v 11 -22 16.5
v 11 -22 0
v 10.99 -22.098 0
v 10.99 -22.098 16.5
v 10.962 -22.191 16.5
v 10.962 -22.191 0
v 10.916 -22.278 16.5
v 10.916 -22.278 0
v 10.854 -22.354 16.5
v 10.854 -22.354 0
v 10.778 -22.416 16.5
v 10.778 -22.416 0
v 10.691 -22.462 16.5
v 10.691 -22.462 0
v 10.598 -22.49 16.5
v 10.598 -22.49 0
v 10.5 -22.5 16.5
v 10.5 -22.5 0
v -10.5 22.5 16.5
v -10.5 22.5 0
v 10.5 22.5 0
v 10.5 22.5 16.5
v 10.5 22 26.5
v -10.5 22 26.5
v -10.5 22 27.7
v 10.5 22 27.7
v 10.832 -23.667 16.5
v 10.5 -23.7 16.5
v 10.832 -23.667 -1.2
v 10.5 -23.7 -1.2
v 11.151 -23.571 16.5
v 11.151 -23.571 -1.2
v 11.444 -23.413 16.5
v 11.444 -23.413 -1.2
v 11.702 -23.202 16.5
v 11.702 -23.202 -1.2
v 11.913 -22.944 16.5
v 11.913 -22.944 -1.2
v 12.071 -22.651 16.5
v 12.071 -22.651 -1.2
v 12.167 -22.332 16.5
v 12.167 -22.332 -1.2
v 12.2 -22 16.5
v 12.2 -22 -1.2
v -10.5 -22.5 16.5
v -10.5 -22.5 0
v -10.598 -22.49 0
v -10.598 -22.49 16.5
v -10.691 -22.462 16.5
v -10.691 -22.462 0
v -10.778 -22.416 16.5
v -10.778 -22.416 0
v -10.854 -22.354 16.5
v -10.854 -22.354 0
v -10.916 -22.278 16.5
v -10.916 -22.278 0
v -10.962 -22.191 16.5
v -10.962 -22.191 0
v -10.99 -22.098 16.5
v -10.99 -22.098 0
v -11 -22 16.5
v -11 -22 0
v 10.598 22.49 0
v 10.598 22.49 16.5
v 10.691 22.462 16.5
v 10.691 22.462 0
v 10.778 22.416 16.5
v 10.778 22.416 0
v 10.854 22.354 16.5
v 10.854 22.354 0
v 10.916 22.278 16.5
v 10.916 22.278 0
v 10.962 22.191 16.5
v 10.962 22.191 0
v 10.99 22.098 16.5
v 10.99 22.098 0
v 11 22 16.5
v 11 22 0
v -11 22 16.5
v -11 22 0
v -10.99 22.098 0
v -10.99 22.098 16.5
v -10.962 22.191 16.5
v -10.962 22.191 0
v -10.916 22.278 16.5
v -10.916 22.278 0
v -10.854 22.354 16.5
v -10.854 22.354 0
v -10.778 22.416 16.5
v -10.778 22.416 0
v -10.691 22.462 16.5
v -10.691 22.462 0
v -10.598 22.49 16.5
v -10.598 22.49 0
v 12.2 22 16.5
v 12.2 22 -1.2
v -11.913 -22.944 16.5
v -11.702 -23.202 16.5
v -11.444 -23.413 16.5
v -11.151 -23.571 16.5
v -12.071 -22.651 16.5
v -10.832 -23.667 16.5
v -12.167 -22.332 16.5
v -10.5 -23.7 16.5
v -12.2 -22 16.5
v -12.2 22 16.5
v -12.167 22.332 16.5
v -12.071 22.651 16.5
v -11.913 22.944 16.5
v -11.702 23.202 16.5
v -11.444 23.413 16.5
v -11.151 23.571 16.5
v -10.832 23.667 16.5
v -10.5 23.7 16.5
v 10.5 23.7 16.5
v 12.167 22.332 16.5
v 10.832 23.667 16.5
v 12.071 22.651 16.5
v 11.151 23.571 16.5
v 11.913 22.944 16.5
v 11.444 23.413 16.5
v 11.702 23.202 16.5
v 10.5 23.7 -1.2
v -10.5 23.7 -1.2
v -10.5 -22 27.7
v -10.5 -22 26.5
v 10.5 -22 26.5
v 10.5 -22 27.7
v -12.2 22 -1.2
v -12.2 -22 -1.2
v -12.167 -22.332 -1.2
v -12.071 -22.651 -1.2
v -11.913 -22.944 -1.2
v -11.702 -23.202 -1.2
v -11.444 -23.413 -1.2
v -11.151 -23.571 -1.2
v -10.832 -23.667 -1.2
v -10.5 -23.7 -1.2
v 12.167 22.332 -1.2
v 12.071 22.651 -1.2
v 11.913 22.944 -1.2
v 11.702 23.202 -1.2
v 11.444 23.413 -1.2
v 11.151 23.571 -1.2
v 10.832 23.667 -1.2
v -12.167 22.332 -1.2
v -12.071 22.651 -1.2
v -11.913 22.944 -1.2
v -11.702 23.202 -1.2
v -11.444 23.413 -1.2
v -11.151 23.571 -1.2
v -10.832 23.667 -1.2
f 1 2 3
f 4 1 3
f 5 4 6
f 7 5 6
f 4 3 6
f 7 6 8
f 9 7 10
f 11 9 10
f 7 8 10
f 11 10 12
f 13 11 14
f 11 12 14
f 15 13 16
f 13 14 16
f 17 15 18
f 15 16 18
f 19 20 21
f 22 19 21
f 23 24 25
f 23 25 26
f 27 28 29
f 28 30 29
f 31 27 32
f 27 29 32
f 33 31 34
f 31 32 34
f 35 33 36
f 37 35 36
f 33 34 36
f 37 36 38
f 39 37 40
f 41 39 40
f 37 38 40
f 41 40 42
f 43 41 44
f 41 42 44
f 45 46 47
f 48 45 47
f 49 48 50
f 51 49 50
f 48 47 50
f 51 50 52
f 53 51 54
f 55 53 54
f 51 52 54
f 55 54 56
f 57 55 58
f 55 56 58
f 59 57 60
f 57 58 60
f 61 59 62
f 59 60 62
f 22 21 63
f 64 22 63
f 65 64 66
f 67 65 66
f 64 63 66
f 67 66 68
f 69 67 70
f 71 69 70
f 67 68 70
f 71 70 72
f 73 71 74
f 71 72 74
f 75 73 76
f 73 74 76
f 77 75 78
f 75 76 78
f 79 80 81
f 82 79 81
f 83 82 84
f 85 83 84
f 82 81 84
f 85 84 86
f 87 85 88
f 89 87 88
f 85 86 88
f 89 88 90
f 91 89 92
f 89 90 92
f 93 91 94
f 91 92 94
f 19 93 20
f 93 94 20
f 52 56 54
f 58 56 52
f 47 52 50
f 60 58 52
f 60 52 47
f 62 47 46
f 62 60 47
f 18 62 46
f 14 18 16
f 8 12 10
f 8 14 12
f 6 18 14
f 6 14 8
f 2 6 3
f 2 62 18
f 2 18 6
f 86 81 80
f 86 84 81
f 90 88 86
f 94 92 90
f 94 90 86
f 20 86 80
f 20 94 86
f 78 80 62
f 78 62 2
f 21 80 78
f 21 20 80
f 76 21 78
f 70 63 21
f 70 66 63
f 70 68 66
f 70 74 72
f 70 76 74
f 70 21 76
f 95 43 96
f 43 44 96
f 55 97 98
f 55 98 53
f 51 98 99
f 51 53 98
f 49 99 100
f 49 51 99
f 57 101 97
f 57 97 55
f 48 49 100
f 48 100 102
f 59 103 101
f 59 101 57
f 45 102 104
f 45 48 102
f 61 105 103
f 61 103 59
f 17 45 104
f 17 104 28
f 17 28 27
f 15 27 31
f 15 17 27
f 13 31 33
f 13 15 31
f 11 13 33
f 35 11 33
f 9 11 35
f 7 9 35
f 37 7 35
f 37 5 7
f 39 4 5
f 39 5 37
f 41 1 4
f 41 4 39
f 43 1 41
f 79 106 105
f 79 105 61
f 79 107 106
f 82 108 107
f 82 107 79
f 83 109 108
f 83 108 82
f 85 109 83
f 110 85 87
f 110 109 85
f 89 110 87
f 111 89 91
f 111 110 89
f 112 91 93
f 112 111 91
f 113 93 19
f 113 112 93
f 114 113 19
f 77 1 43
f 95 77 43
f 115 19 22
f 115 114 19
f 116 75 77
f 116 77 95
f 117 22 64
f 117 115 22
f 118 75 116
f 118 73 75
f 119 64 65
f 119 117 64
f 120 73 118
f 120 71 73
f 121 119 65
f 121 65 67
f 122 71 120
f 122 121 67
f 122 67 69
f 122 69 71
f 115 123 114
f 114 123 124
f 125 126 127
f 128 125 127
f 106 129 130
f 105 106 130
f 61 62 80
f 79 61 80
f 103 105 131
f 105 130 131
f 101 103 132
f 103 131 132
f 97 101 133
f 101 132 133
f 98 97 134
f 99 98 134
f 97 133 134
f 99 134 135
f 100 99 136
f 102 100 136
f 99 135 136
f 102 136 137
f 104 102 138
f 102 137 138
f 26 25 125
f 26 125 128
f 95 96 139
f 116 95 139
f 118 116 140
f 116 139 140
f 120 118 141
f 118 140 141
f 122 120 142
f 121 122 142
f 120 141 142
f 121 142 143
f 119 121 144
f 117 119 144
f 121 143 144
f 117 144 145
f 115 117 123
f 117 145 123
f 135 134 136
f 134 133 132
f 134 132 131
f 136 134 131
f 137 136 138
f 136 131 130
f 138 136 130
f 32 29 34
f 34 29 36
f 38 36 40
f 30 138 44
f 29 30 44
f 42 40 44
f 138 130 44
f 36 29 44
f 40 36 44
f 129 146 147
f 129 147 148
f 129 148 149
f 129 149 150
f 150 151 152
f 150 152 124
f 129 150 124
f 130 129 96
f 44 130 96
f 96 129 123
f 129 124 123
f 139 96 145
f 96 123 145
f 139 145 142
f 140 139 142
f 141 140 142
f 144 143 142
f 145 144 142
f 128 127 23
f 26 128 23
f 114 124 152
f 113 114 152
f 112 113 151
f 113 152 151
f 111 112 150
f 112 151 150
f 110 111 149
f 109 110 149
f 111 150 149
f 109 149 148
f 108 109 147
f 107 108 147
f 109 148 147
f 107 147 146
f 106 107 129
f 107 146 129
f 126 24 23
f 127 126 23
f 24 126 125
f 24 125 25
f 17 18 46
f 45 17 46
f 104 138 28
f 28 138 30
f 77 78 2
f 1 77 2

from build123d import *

# Parameters (mm, degrees)
F1_DEPTH = 1.2
F2_DEPTH = 16.5
F4_W     = 21
F4_H     = 44
F5_DEPTH = 1.2


with BuildPart() as f1:
    # F0 (on Top) → F1 (new body)
    with BuildSketch(Plane.XY):
        with BuildLine():
            Line((-12.2, 22), (-12.2, -22))
            ThreePointArc((-12.2, -22), (-11.702082, -23.202082), (-10.5, -23.7))
            Line((-10.5, -23.7), (10.5, -23.7))
            ThreePointArc((10.5, -23.7), (11.702082, -23.202082), (12.2, -22))
            Line((12.2, -22), (12.2, 22))
            ThreePointArc((12.2, 22), (11.702082, 23.202082), (10.5, 23.7))
            Line((10.5, 23.7), (-10.5, 23.7))
            ThreePointArc((-10.5, 23.7), (-11.702082, 23.202082), (-12.2, 22))
        make_face()
        with BuildLine():
            ThreePointArc((11, -22), (10.853553, -22.353553), (10.5, -22.5))
            Line((10.5, -22.5), (-10.5, -22.5))
            ThreePointArc((-10.5, -22.5), (-10.853553, -22.353553), (-11, -22))
            Line((-11, -22), (-11, 22))
            ThreePointArc((-11, 22), (-10.853553, 22.353553), (-10.5, 22.5))
            Line((-10.5, 22.5), (10.5, 22.5))
            ThreePointArc((10.5, 22.5), (10.853553, 22.353553), (11, 22))
            Line((11, 22), (11, -22))
        make_face(mode=Mode.SUBTRACT)
        with BuildLine():
            Line((-10.5, -22.5), (10.5, -22.5))
            ThreePointArc((10.5, -22.5), (10.853553, -22.353553), (11, -22))
            Line((11, -22), (11, 22))
            ThreePointArc((11, 22), (10.853553, 22.353553), (10.5, 22.5))
            Line((10.5, 22.5), (-10.5, 22.5))
            ThreePointArc((-10.5, 22.5), (-10.853553, 22.353553), (-11, 22))
            Line((-11, 22), (-11, -22))
            ThreePointArc((-11, -22), (-10.853553, -22.353553), (-10.5, -22.5))
        make_face()
    extrude(amount=-F1_DEPTH)

    # F0 (on Top) → F2 (join)
    with BuildSketch(Plane.XY):
        with BuildLine():
            Line((-12.2, 22), (-12.2, -22))
            ThreePointArc((-12.2, -22), (-11.702082, -23.202082), (-10.5, -23.7))
            Line((-10.5, -23.7), (10.5, -23.7))
            ThreePointArc((10.5, -23.7), (11.702082, -23.202082), (12.2, -22))
            Line((12.2, -22), (12.2, 22))
            ThreePointArc((12.2, 22), (11.702082, 23.202082), (10.5, 23.7))
            Line((10.5, 23.7), (-10.5, 23.7))
            ThreePointArc((-10.5, 23.7), (-11.702082, 23.202082), (-12.2, 22))
        make_face()
        with BuildLine():
            ThreePointArc((11, -22), (10.853553, -22.353553), (10.5, -22.5))
            Line((10.5, -22.5), (-10.5, -22.5))
            ThreePointArc((-10.5, -22.5), (-10.853553, -22.353553), (-11, -22))
            Line((-11, -22), (-11, 22))
            ThreePointArc((-11, 22), (-10.853553, 22.353553), (-10.5, 22.5))
            Line((-10.5, 22.5), (10.5, 22.5))
            ThreePointArc((10.5, 22.5), (10.853553, 22.353553), (11, 22))
            Line((11, 22), (11, -22))
        make_face(mode=Mode.SUBTRACT)
    extrude(amount=F2_DEPTH)


with BuildPart() as f5:
    # F4 (on offset) → F5 (new body)
    with BuildSketch(Plane.XY.offset(26.5)):
        Rectangle(F4_W, F4_H)
    extrude(amount=F5_DEPTH)


solid = Compound([f1.part, f5.part])
